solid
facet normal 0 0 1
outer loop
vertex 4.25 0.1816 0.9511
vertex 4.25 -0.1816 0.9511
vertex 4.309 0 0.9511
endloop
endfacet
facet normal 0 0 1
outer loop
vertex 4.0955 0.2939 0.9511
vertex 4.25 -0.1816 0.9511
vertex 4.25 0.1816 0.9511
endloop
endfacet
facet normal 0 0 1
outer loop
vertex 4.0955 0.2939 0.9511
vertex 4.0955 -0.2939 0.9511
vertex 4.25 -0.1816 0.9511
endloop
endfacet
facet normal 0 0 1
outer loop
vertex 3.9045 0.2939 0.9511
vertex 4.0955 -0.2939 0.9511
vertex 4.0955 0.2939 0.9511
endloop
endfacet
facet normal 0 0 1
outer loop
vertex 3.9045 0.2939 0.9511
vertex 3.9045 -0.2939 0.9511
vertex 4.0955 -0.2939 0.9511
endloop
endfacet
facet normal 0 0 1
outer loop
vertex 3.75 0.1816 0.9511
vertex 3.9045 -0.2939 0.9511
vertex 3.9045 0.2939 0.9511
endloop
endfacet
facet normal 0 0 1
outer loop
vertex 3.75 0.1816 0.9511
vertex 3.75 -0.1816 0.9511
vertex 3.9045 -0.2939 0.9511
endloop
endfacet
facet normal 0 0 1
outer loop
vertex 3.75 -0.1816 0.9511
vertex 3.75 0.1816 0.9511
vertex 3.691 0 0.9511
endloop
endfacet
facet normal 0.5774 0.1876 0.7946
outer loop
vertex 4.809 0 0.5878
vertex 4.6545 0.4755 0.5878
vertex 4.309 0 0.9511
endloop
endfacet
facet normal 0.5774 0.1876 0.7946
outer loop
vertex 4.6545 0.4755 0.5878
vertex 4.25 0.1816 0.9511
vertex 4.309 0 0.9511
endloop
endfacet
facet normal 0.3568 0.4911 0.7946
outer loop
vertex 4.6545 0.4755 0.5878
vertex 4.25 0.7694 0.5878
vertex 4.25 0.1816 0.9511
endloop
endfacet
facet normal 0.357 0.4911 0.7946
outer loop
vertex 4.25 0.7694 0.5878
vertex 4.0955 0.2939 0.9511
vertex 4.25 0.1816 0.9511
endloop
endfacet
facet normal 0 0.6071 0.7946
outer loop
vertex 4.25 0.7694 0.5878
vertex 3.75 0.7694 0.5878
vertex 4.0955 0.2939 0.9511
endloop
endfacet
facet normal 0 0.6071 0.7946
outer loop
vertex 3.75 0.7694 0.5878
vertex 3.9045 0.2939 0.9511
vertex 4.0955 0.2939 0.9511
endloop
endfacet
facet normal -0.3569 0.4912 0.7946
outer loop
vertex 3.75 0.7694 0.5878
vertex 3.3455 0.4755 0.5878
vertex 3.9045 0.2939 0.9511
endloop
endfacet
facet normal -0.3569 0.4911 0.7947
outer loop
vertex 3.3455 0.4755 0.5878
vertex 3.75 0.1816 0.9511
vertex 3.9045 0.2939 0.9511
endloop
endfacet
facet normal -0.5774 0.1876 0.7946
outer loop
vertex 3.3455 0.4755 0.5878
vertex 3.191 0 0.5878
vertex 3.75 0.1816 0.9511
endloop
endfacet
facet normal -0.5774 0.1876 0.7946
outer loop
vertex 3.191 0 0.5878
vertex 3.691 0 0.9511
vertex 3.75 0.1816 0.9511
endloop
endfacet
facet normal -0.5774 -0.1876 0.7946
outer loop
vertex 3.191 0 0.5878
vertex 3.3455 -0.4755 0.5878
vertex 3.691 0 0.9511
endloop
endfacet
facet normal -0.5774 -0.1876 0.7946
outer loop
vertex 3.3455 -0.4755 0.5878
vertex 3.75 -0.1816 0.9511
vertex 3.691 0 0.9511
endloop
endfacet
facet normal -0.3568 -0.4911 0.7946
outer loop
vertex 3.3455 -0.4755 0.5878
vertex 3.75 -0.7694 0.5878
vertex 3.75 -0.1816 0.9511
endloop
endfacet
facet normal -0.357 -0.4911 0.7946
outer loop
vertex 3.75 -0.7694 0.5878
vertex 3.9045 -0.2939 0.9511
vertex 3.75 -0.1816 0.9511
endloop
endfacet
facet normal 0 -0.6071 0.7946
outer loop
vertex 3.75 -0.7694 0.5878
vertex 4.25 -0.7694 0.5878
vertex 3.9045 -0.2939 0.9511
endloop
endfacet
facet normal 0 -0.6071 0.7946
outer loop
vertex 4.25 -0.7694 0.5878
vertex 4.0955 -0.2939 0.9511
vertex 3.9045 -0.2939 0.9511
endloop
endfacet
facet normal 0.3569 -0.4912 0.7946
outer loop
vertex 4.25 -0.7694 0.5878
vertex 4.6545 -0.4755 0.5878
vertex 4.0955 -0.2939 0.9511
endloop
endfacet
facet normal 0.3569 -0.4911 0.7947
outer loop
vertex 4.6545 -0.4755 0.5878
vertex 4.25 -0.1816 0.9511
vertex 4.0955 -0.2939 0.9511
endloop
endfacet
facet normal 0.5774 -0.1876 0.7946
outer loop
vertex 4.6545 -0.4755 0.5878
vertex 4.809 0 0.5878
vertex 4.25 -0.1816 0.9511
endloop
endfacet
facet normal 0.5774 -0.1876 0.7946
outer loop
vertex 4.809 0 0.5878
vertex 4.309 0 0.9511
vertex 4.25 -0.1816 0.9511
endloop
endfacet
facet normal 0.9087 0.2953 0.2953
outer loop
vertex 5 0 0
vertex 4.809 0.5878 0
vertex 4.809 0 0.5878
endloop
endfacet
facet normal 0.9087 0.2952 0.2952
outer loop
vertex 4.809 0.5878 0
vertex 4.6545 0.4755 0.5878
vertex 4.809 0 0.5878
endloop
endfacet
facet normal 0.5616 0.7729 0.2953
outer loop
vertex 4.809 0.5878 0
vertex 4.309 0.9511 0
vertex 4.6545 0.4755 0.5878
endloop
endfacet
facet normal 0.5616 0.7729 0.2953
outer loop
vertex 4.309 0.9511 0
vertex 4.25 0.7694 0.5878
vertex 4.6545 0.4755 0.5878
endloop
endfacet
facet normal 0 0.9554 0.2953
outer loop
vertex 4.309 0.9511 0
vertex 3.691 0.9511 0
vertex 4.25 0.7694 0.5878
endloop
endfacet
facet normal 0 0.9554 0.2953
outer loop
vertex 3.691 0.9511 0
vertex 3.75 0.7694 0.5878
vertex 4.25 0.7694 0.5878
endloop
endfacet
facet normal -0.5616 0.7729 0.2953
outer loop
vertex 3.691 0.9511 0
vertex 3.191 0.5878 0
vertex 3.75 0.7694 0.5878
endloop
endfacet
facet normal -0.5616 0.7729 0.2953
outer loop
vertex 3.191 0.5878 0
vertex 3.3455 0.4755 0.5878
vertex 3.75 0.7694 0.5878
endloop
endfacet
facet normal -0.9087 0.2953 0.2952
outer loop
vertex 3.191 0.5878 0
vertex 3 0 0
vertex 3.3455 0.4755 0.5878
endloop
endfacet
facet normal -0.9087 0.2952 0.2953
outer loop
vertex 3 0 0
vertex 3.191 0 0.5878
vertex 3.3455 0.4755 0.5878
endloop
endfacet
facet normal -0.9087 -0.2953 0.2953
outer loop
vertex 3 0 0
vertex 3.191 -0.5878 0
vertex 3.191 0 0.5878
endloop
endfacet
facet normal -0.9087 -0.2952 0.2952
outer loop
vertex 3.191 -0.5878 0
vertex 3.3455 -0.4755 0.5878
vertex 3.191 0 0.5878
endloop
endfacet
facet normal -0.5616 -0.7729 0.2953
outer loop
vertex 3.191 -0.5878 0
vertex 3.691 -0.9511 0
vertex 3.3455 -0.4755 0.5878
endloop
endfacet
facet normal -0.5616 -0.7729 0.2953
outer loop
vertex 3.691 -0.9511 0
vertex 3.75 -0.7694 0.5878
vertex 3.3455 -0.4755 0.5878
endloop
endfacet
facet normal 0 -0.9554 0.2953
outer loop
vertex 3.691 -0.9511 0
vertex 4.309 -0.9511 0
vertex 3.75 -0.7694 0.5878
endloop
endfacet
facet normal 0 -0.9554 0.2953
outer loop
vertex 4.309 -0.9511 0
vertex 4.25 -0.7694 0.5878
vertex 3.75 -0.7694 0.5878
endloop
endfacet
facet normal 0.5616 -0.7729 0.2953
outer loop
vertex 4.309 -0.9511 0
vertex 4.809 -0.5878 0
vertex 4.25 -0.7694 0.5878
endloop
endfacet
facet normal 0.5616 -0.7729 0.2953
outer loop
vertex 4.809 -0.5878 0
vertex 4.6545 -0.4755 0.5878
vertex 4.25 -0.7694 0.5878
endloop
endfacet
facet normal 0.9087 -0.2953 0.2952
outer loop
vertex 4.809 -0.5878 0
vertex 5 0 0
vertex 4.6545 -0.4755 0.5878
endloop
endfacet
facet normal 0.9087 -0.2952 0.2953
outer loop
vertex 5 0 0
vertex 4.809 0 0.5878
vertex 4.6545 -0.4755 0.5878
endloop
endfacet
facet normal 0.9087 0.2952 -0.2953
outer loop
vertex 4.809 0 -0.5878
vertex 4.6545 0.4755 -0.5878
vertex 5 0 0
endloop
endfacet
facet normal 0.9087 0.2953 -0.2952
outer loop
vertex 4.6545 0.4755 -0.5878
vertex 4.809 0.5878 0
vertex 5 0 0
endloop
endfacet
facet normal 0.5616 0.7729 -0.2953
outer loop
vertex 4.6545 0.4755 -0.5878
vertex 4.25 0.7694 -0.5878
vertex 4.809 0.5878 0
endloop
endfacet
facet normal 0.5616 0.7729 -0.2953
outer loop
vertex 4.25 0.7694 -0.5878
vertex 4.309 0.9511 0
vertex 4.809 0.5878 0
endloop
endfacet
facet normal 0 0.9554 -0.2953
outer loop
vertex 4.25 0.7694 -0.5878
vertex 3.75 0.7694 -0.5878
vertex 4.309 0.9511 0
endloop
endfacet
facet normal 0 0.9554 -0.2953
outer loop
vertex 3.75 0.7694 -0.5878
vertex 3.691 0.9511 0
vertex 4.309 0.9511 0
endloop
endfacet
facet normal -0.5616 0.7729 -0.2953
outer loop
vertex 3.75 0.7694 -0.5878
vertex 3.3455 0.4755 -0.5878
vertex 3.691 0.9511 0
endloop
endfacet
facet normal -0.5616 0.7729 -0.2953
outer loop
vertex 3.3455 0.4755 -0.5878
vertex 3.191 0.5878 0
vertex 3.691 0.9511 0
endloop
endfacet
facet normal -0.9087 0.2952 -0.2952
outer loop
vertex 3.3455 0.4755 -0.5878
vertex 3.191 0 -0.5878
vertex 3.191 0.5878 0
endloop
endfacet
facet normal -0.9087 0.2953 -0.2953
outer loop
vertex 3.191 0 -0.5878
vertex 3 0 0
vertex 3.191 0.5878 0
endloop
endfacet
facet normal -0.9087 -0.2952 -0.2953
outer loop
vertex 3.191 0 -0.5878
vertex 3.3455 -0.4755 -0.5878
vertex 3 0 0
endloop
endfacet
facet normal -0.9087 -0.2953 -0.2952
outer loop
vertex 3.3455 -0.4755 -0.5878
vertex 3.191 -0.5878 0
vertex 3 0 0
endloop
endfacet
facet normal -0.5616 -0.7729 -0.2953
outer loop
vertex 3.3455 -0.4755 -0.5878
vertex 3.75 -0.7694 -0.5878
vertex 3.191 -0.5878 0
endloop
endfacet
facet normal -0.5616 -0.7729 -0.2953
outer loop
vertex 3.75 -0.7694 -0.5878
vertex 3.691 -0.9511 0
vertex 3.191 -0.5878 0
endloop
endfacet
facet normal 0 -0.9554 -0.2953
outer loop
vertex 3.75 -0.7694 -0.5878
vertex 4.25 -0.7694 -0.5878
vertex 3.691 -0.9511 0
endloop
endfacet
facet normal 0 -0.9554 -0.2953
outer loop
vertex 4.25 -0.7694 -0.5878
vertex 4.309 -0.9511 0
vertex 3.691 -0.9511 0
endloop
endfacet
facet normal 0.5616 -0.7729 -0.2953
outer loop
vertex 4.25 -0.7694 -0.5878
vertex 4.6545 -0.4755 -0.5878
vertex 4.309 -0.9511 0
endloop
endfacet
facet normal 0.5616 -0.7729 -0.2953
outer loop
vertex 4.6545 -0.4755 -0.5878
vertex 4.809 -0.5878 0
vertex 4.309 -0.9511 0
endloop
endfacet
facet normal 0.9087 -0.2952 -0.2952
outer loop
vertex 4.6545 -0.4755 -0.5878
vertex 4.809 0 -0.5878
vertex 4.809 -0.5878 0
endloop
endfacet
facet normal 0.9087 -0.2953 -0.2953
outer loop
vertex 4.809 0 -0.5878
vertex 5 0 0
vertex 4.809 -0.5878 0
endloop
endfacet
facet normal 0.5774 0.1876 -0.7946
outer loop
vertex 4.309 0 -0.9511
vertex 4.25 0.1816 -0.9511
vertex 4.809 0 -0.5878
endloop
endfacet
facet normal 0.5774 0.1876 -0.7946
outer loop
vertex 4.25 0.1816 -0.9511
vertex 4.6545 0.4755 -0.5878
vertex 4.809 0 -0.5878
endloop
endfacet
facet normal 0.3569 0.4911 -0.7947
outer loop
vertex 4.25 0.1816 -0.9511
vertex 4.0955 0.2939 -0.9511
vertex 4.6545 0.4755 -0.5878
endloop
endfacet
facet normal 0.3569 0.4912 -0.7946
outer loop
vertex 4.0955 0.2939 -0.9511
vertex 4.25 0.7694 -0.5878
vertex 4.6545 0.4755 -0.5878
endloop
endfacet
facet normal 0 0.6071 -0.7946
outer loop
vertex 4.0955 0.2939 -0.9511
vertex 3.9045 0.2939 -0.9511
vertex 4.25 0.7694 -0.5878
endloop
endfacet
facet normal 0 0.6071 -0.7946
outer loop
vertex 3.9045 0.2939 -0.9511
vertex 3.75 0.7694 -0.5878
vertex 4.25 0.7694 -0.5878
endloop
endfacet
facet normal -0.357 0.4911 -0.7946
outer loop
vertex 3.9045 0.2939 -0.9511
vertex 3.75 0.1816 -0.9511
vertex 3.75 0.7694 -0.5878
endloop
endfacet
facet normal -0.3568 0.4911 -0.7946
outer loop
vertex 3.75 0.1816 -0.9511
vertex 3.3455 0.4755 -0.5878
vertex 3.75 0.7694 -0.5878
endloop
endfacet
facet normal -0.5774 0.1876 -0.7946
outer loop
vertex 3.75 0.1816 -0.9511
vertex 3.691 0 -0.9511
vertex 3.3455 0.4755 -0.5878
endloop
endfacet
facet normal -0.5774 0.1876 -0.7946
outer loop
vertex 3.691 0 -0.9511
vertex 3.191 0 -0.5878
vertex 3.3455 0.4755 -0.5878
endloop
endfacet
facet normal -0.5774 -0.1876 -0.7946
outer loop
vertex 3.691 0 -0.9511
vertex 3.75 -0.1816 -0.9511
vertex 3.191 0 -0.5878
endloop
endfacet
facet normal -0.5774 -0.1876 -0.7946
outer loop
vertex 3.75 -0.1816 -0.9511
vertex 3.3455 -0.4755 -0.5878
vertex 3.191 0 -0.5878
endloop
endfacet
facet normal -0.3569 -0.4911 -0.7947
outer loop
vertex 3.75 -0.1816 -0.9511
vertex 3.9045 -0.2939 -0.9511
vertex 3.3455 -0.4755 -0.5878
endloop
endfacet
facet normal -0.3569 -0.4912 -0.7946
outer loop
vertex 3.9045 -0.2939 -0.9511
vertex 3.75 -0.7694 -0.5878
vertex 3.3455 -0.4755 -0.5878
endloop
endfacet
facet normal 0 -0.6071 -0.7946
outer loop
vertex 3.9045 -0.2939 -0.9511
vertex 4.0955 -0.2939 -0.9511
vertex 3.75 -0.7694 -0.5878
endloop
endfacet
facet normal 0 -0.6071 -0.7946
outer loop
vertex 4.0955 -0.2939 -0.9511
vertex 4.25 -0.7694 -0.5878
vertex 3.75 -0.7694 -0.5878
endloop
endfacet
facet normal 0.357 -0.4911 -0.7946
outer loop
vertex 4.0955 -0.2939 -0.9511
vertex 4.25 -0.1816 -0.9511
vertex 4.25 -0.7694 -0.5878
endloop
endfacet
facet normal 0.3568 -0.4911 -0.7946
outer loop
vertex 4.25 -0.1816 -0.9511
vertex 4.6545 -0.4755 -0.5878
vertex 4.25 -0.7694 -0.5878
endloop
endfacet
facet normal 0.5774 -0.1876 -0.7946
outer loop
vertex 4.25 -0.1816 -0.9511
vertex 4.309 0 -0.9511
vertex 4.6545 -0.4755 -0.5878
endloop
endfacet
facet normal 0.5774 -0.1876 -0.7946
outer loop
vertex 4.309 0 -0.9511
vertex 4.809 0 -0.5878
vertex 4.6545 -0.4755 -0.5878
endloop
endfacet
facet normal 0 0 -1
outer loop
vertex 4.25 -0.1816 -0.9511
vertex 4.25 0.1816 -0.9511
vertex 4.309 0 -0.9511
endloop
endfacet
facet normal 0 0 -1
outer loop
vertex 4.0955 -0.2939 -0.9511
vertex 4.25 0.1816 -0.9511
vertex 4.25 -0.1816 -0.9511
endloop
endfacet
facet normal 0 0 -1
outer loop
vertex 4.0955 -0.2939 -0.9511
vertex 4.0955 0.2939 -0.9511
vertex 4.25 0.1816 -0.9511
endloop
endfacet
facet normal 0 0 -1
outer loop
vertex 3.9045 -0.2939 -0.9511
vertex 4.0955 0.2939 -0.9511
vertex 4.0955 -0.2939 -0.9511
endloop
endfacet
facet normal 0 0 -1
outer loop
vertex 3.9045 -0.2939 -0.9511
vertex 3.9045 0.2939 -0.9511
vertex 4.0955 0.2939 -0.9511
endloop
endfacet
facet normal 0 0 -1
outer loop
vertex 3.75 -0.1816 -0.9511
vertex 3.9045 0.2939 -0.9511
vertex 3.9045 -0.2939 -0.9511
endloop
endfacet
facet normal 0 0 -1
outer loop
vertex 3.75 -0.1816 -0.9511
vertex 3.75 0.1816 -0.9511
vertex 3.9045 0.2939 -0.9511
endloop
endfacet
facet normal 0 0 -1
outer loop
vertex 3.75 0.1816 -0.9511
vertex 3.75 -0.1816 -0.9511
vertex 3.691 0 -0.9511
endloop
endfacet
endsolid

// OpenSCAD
// ! renders only that subtree
cube(3);
!translate([4, 0, 0]) sphere(1, $fn = 10);
